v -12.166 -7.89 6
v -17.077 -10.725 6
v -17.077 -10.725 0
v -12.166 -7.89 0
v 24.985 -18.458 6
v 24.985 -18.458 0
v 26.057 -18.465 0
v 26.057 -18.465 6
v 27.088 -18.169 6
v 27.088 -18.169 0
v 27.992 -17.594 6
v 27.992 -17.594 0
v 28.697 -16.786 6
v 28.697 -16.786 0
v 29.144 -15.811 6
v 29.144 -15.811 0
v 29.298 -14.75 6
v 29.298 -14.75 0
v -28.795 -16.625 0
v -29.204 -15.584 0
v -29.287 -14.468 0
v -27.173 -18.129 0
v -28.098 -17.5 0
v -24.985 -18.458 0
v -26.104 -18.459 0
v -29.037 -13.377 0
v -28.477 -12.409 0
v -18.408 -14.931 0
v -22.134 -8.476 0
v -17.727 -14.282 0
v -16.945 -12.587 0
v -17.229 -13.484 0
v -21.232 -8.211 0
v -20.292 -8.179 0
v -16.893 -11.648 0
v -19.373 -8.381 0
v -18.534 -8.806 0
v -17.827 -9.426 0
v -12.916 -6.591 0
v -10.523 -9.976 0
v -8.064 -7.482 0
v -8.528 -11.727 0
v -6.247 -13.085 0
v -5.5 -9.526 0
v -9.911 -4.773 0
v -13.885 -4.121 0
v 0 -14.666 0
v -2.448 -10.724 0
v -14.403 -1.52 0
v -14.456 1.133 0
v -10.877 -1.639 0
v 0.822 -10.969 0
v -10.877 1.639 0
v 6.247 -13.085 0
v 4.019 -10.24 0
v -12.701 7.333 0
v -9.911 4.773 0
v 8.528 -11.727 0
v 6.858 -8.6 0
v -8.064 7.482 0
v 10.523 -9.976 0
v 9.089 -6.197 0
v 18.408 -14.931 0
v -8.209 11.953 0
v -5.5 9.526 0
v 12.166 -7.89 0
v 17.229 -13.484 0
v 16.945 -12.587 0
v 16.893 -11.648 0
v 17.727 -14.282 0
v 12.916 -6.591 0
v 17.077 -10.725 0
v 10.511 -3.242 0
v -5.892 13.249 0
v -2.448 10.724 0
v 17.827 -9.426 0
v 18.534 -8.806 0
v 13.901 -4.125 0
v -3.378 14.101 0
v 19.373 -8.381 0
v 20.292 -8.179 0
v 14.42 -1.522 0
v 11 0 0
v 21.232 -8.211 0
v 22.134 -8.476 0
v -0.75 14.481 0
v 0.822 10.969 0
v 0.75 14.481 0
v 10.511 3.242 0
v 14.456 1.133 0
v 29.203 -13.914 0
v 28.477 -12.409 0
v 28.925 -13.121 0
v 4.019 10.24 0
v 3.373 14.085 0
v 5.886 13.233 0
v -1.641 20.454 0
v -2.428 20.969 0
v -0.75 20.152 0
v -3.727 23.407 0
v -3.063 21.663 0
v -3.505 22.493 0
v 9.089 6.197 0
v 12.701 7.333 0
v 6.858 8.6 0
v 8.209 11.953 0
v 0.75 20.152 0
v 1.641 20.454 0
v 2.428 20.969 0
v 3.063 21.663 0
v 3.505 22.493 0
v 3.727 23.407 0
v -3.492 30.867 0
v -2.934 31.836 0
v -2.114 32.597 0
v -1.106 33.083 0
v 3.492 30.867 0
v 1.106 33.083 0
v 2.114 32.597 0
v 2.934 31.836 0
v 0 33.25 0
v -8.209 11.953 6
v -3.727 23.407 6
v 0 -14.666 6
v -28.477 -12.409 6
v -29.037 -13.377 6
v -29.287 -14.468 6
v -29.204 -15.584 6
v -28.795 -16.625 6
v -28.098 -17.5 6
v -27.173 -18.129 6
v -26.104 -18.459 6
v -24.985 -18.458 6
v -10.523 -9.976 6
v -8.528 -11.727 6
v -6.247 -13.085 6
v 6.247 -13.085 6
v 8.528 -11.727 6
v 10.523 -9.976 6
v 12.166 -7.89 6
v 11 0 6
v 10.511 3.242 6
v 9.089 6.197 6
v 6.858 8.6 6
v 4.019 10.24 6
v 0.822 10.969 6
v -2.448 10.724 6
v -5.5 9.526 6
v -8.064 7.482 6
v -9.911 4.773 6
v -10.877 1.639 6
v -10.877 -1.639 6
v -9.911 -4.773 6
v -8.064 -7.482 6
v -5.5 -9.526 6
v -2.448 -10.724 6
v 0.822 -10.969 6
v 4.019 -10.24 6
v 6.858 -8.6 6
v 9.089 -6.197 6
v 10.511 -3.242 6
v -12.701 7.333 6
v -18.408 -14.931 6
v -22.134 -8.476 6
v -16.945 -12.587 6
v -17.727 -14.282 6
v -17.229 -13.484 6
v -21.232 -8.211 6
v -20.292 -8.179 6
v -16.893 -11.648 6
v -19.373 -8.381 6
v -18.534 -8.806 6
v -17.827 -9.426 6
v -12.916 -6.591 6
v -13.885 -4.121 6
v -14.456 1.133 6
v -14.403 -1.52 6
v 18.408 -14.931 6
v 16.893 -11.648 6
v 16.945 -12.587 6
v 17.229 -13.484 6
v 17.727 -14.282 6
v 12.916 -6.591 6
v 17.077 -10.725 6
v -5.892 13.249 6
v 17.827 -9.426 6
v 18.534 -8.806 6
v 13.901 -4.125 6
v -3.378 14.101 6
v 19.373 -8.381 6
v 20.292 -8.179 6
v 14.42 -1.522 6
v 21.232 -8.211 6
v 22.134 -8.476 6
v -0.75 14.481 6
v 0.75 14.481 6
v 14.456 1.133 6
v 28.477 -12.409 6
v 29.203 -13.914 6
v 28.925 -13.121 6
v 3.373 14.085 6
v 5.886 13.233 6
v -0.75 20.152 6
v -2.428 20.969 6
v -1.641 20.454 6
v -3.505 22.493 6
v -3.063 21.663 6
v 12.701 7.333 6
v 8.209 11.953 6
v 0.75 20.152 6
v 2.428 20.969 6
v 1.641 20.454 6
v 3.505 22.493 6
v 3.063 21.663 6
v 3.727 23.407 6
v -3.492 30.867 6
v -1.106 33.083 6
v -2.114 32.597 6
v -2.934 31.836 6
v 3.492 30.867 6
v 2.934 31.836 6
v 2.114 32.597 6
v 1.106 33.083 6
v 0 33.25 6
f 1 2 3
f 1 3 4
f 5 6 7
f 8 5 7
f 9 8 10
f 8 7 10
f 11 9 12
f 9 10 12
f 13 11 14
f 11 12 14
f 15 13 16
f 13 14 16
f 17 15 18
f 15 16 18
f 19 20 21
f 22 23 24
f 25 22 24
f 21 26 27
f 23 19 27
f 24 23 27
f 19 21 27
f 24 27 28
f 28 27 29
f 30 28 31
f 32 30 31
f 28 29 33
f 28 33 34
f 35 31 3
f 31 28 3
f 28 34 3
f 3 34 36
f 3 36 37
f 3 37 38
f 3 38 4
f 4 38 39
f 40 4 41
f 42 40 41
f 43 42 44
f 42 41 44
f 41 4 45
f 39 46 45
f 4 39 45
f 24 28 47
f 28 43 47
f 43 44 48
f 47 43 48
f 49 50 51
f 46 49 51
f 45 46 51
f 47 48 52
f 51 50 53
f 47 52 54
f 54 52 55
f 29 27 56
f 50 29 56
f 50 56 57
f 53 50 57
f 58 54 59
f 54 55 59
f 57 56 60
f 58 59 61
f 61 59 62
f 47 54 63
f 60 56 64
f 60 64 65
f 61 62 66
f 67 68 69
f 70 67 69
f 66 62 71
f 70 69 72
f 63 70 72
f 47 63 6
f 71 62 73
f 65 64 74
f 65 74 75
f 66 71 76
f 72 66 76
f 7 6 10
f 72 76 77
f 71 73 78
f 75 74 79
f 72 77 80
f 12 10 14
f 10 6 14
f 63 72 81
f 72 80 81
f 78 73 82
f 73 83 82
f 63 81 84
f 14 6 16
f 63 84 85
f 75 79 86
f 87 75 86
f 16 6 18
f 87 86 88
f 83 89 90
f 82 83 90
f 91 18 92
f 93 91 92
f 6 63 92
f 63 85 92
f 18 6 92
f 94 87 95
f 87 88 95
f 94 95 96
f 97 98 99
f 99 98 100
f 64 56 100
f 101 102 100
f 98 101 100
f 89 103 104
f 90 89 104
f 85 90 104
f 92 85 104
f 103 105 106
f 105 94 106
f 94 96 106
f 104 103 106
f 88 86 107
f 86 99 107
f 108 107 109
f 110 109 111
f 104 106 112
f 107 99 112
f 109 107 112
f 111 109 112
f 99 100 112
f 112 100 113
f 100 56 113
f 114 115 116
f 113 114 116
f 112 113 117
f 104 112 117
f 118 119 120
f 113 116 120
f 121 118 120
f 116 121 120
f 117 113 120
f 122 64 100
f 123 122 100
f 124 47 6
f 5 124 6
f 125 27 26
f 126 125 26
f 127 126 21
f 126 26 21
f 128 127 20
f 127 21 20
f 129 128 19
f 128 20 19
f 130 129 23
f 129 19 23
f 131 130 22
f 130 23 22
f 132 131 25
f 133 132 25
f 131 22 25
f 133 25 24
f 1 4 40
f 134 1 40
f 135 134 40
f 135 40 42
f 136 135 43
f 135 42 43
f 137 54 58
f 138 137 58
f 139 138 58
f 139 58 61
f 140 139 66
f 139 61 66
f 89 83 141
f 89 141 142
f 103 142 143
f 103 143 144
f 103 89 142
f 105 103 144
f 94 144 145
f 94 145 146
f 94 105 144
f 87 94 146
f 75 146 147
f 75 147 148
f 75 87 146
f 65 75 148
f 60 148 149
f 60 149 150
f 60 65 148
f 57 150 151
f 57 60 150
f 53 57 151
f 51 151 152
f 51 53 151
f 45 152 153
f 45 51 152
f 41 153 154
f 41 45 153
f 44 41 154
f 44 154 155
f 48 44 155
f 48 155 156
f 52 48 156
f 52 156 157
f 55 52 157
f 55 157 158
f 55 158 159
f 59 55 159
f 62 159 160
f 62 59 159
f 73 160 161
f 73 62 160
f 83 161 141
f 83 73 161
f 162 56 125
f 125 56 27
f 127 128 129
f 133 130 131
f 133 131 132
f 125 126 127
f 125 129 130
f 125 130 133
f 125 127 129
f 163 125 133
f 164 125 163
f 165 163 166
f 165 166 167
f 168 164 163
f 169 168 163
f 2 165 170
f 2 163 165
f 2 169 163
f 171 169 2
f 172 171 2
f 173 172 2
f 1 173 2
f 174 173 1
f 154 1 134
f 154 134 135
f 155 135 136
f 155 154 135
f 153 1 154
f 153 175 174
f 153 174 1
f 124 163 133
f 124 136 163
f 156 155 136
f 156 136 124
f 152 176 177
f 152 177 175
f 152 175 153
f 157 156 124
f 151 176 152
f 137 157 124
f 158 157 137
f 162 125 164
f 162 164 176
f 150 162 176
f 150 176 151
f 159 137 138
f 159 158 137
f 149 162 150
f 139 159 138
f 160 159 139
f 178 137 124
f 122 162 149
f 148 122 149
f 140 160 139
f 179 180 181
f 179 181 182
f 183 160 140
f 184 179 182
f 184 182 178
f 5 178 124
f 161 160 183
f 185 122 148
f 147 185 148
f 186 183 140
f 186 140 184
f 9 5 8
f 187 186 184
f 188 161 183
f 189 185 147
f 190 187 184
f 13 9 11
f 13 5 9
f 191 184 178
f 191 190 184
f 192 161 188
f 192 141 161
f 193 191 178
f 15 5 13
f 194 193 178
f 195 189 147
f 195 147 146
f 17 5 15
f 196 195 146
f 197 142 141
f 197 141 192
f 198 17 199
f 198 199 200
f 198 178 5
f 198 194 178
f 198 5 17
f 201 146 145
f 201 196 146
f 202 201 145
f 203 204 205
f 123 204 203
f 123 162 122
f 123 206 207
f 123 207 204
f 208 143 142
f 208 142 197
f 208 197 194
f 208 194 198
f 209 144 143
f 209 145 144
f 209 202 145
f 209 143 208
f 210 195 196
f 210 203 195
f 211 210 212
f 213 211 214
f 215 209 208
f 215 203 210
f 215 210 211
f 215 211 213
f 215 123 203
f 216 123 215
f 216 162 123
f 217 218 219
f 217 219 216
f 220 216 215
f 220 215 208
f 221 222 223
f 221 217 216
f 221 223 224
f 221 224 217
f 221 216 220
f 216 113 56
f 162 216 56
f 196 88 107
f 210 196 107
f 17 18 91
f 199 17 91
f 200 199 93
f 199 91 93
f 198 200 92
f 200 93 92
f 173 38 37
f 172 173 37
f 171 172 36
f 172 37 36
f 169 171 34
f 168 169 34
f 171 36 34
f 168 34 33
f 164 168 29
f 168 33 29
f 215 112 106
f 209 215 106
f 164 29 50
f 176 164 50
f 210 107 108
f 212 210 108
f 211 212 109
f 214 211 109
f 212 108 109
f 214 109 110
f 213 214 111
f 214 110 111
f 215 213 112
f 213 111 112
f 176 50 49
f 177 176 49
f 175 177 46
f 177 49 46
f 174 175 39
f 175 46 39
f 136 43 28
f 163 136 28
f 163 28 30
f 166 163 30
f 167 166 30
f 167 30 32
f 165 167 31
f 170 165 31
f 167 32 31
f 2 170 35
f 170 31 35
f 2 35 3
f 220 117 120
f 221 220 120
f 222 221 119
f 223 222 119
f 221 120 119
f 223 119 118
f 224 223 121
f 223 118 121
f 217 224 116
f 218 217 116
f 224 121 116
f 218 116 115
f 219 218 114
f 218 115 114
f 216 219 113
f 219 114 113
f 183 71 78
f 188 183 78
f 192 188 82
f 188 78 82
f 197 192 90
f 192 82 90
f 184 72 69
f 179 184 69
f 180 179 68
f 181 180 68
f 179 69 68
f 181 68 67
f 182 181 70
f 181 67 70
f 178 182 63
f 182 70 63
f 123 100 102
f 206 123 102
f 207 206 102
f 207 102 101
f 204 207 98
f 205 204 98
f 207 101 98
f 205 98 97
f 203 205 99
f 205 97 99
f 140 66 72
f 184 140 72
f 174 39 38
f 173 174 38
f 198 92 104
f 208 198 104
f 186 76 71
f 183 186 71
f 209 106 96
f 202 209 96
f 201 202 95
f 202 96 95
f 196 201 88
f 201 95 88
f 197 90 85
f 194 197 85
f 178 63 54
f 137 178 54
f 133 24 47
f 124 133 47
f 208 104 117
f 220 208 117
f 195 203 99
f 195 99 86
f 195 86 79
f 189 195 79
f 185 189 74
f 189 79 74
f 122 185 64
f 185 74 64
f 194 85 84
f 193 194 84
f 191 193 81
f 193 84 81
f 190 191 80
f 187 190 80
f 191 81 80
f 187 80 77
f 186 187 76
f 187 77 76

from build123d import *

# Parameters (mm, degrees)
F0_R     = 11
F1_DEPTH = 6


with BuildPart() as f1:
    # F0 (on Top) → F1 (new body)
    with BuildSketch(Plane.XY):
        with BuildLine():
            Line((-23.4410374628, -14.399714693), (-21.9907688963, -13.5624017458))
            ThreePointArc((-21.9907688963, -13.5624017458), (-22.3001541474, -12.875), (-22.7407688963, -12.2633636401))
            Line((-22.7407688963, -12.2633636401), (-24.1910374628, -13.1006765873))
            ThreePointArc((-24.1910374628, -13.1006765873), (-24.3757674093, -12.1622827062), (-24.317114362, -11.2076790978))
            ThreePointArc((-24.317114362, -11.2076790978), (-26.5881000277, -11.1471996176), (-28.4772699032, -12.4089725142))
            ThreePointArc((-28.4772699032, -12.4089725142), (-28.7953446758, -16.625), (-24.9851203838, -18.4575529095))
            ThreePointArc((-24.9851203838, -18.4575529095), (-22.9478080637, -17.4523702536), (-21.8646919971, -15.4553992353))
            ThreePointArc((-21.8646919971, -15.4553992353), (-22.7207294962, -15.0288924601), (-23.4410374628, -14.399714693))
        make_face()
        with BuildLine():
            Line((-17.0770764321, -10.7254800788), (-12.1655591981, -7.8898142816))
            ThreePointArc((-12.1655591981, -7.8898142816), (-9.565708177, -10.8971201275), (-6.2468655995, -13.0853609114))
            Line((-6.2468655995, -13.0853609114), (-18.4079175052, -14.9308263649))
            Line((-18.4079175052, -14.9308263649), (-21.8646919971, -15.4553992353))
            ThreePointArc((-21.8646919971, -15.4553992353), (-22.9478080637, -17.4523702536), (-24.9851203838, -18.4575529095))
            Line((-24.9851203838, -18.4575529095), (0, -14.6660078296))
            Line((0, -14.6660078296), (24.9851203838, -18.4575529095))
            ThreePointArc((24.9851203838, -18.4575529095), (22.9478080637, -17.4523702536), (21.8646919971, -15.4553992353))
            Line((21.8646919971, -15.4553992353), (18.4079175052, -14.9308263649))
            Line((18.4079175052, -14.9308263649), (6.2468655995, -13.0853609114))
            ThreePointArc((6.2468655995, -13.0853609114), (9.565708177, -10.8971201275), (12.1655591981, -7.8898142816))
            Line((12.1655591981, -7.8898142816), (17.0770764321, -10.7254800788))
            ThreePointArc((17.0770764321, -10.7254800788), (17.3864616832, -10.0380783331), (17.8270764321, -9.4264419731))
            Line((17.8270764321, -9.4264419731), (12.9155591981, -6.5907761759))
            ThreePointArc((12.9155591981, -6.5907761759), (14.220036947, -2.8355862227), (14.4556877667, 1.1327361525))
            Line((14.4556877667, 1.1327361525), (22.1344336841, -8.4763110078))
            Line((22.1344336841, -8.4763110078), (24.317114362, -11.2076790978))
            ThreePointArc((24.317114362, -11.2076790978), (26.5881000277, -11.1471996176), (28.4772699032, -12.4089725142))
            Line((28.4772699032, -12.4089725142), (12.7011353526, 7.3330039148))
            Line((12.7011353526, 7.3330039148), (3.4921495195, 30.8665254237))
            ThreePointArc((3.4921495195, 30.8665254237), (0, 33.25), (-3.4921495195, 30.8665254237))
            Line((-3.4921495195, 30.8665254237), (-12.7011353526, 7.3330039148))
            Line((-12.7011353526, 7.3330039148), (-28.4772699032, -12.4089725142))
            ThreePointArc((-28.4772699032, -12.4089725142), (-26.5881000277, -11.1471996176), (-24.317114362, -11.2076790978))
            Line((-24.317114362, -11.2076790978), (-22.1344336841, -8.4763110078))
            Line((-22.1344336841, -8.4763110078), (-14.4556877667, 1.1327361525))
            ThreePointArc((-14.4556877667, 1.1327361525), (-14.2015636478, -2.8319025028), (-12.9155591981, -6.5907761759))
            Line((-12.9155591981, -6.5907761759), (-17.8270764321, -9.4264419731))
            ThreePointArc((-17.8270764321, -9.4264419731), (-17.3864616832, -10.0380783331), (-17.0770764321, -10.7254800788))
        make_face()
        Circle(F0_R, mode=Mode.SUBTRACT)
        with BuildLine():
            Line((-0.75, 27.5003912803), (-0.75, 20.151922052))
            Line((-0.75, 20.151922052), (-0.75, 14.4805904576))
            ThreePointArc((-0.75, 14.4805904576), (-4.65432877, 13.7327063502), (-8.2088221672, 11.9526247589))
            Line((-8.2088221672, 11.9526247589), (-3.7265161789, 23.4071373727))
            Line((-3.7265161789, 23.4071373727), (-2.4524223649, 26.6630783331))
            ThreePointArc((-2.4524223649, 26.6630783331), (-1.6550379131, 27.1911751663), (-0.75, 27.5003912803))
        make_face(mode=Mode.SUBTRACT)
        with BuildLine():
            ThreePointArc((0.75, 27.5003912803), (1.6550379131, 27.1911751663), (2.4524223649, 26.6630783331))
            Line((2.4524223649, 26.6630783331), (3.7265161789, 23.4071373727))
            Line((3.7265161789, 23.4071373727), (8.2088221672, 11.9526247589))
            ThreePointArc((8.2088221672, 11.9526247589), (4.6482823154, 13.7148661438), (0.75, 14.4805904576))
            Line((0.75, 14.4805904576), (0.75, 20.151922052))
            Line((0.75, 20.151922052), (0.75, 27.5003912803))
        make_face(mode=Mode.SUBTRACT)
        with BuildLine():
            ThreePointArc((21.8646919971, -15.4553992353), (22.9478080637, -17.4523702536), (24.9851203838, -18.4575529095))
            ThreePointArc((24.9851203838, -18.4575529095), (27.9924008332, -17.5936208304), (29.2977494116, -14.75))
            ThreePointArc((29.2977494116, -14.75), (29.0866900613, -13.5096778329), (28.4772699032, -12.4089725142))
            ThreePointArc((28.4772699032, -12.4089725142), (26.5881000277, -11.1471996176), (24.317114362, -11.2076790978))
            ThreePointArc((24.317114362, -11.2076790978), (24.3757674093, -12.1622827062), (24.1910374628, -13.1006765873))
            Line((24.1910374628, -13.1006765873), (22.7407688963, -12.2633636401))
            ThreePointArc((22.7407688963, -12.2633636401), (22.3001541474, -12.875), (21.9907688963, -13.5624017458))
            Line((21.9907688963, -13.5624017458), (23.4410374628, -14.399714693))
            ThreePointArc((23.4410374628, -14.399714693), (22.7207294962, -15.0288924601), (21.8646919971, -15.4553992353))
        make_face()
        with BuildLine():
            Line((-24.1910374628, -13.1006765873), (-22.7407688963, -12.2633636401))
            ThreePointArc((-22.7407688963, -12.2633636401), (-23.4610768628, -11.634185873), (-24.317114362, -11.2076790978))
            ThreePointArc((-24.317114362, -11.2076790978), (-24.3757674093, -12.1622827062), (-24.1910374628, -13.1006765873))
        make_face()
        with BuildLine():
            Line((-22.7407688963, -12.2633636401), (-17.8270764321, -9.4264419731))
            ThreePointArc((-17.8270764321, -9.4264419731), (-19.8262880625, -8.251110361), (-22.1344336841, -8.4763110078))
            Line((-22.1344336841, -8.4763110078), (-24.317114362, -11.2076790978))
            ThreePointArc((-24.317114362, -11.2076790978), (-23.4610768628, -11.634185873), (-22.7407688963, -12.2633636401))
        make_face()
        with BuildLine():
            ThreePointArc((-18.4079175052, -14.9308263649), (-17.0588152133, -13.0445139444), (-17.0770764321, -10.7254800788))
            Line((-17.0770764321, -10.7254800788), (-21.9907688963, -13.5624017458))
            ThreePointArc((-21.9907688963, -13.5624017458), (-21.8463188144, -14.1484091642), (-21.7977494116, -14.75))
            ThreePointArc((-21.7977494116, -14.75), (-21.8145225699, -15.1042842753), (-21.8646919971, -15.4553992353))
            Line((-21.8646919971, -15.4553992353), (-18.4079175052, -14.9308263649))
        make_face()
        with BuildLine():
            ThreePointArc((-21.7977494116, -14.75), (-21.8463188144, -14.1484091642), (-21.9907688963, -13.5624017458))
            Line((-21.9907688963, -13.5624017458), (-23.4410374628, -14.399714693))
            ThreePointArc((-23.4410374628, -14.399714693), (-22.7207294962, -15.0288924601), (-21.8646919971, -15.4553992353))
            ThreePointArc((-21.8646919971, -15.4553992353), (-21.8145225699, -15.1042842753), (-21.7977494116, -14.75))
        make_face()
        with BuildLine():
            Line((-21.9907688963, -13.5624017458), (-17.0770764321, -10.7254800788))
            ThreePointArc((-17.0770764321, -10.7254800788), (-17.3864616832, -10.0380783331), (-17.8270764321, -9.4264419731))
            Line((-17.8270764321, -9.4264419731), (-22.7407688963, -12.2633636401))
            ThreePointArc((-22.7407688963, -12.2633636401), (-22.3001541474, -12.875), (-21.9907688963, -13.5624017458))
        make_face()
        with BuildLine():
            Line((18.4079175052, -14.9308263649), (21.8646919971, -15.4553992353))
            ThreePointArc((21.8646919971, -15.4553992353), (21.8060389498, -14.5007956269), (21.9907688963, -13.5624017458))
            Line((21.9907688963, -13.5624017458), (17.0770764321, -10.7254800788))
            ThreePointArc((17.0770764321, -10.7254800788), (17.0588152133, -13.0445139444), (18.4079175052, -14.9308263649))
        make_face()
        with BuildLine():
            Line((17.8270764321, -9.4264419731), (22.7407688963, -12.2633636401))
            ThreePointArc((22.7407688963, -12.2633636401), (23.4610768628, -11.634185873), (24.317114362, -11.2076790978))
            Line((24.317114362, -11.2076790978), (22.1344336841, -8.4763110078))
            ThreePointArc((22.1344336841, -8.4763110078), (19.8262880625, -8.251110361), (17.8270764321, -9.4264419731))
        make_face()
        with BuildLine():
            Line((17.0770764321, -10.7254800788), (21.9907688963, -13.5624017458))
            ThreePointArc((21.9907688963, -13.5624017458), (22.3001541474, -12.875), (22.7407688963, -12.2633636401))
            Line((22.7407688963, -12.2633636401), (17.8270764321, -9.4264419731))
            ThreePointArc((17.8270764321, -9.4264419731), (17.3864616832, -10.0380783331), (17.0770764321, -10.7254800788))
        make_face()
        with BuildLine():
            ThreePointArc((-3.7265161789, 23.4071373727), (-2.7674728492, 21.2956243054), (-0.75, 20.151922052))
            Line((-0.75, 20.151922052), (-0.75, 27.5003912803))
            ThreePointArc((-0.75, 27.5003912803), (-1.6550379131, 27.1911751663), (-2.4524223649, 26.6630783331))
            Line((-2.4524223649, 26.6630783331), (-3.7265161789, 23.4071373727))
        make_face()
        with BuildLine():
            Line((3.7265161789, 23.4071373727), (2.4524223649, 26.6630783331))
            ThreePointArc((2.4524223649, 26.6630783331), (1.6550379131, 27.1911751663), (0.75, 27.5003912803))
            Line((0.75, 27.5003912803), (0.75, 20.151922052))
            ThreePointArc((0.75, 20.151922052), (2.7674728492, 21.2956243054), (3.7265161789, 23.4071373727))
        make_face()
        with BuildLine():
            ThreePointArc((24.317114362, -11.2076790978), (23.4610768628, -11.634185873), (22.7407688963, -12.2633636401))
            Line((22.7407688963, -12.2633636401), (24.1910374628, -13.1006765873))
            ThreePointArc((24.1910374628, -13.1006765873), (24.3757674093, -12.1622827062), (24.317114362, -11.2076790978))
        make_face()
        with BuildLine():
            ThreePointArc((21.9907688963, -13.5624017458), (21.8060389498, -14.5007956269), (21.8646919971, -15.4553992353))
            ThreePointArc((21.8646919971, -15.4553992353), (22.7207294962, -15.0288924601), (23.4410374628, -14.399714693))
            Line((23.4410374628, -14.399714693), (21.9907688963, -13.5624017458))
        make_face()
    extrude(amount=F1_DEPTH)


solid = f1.part
